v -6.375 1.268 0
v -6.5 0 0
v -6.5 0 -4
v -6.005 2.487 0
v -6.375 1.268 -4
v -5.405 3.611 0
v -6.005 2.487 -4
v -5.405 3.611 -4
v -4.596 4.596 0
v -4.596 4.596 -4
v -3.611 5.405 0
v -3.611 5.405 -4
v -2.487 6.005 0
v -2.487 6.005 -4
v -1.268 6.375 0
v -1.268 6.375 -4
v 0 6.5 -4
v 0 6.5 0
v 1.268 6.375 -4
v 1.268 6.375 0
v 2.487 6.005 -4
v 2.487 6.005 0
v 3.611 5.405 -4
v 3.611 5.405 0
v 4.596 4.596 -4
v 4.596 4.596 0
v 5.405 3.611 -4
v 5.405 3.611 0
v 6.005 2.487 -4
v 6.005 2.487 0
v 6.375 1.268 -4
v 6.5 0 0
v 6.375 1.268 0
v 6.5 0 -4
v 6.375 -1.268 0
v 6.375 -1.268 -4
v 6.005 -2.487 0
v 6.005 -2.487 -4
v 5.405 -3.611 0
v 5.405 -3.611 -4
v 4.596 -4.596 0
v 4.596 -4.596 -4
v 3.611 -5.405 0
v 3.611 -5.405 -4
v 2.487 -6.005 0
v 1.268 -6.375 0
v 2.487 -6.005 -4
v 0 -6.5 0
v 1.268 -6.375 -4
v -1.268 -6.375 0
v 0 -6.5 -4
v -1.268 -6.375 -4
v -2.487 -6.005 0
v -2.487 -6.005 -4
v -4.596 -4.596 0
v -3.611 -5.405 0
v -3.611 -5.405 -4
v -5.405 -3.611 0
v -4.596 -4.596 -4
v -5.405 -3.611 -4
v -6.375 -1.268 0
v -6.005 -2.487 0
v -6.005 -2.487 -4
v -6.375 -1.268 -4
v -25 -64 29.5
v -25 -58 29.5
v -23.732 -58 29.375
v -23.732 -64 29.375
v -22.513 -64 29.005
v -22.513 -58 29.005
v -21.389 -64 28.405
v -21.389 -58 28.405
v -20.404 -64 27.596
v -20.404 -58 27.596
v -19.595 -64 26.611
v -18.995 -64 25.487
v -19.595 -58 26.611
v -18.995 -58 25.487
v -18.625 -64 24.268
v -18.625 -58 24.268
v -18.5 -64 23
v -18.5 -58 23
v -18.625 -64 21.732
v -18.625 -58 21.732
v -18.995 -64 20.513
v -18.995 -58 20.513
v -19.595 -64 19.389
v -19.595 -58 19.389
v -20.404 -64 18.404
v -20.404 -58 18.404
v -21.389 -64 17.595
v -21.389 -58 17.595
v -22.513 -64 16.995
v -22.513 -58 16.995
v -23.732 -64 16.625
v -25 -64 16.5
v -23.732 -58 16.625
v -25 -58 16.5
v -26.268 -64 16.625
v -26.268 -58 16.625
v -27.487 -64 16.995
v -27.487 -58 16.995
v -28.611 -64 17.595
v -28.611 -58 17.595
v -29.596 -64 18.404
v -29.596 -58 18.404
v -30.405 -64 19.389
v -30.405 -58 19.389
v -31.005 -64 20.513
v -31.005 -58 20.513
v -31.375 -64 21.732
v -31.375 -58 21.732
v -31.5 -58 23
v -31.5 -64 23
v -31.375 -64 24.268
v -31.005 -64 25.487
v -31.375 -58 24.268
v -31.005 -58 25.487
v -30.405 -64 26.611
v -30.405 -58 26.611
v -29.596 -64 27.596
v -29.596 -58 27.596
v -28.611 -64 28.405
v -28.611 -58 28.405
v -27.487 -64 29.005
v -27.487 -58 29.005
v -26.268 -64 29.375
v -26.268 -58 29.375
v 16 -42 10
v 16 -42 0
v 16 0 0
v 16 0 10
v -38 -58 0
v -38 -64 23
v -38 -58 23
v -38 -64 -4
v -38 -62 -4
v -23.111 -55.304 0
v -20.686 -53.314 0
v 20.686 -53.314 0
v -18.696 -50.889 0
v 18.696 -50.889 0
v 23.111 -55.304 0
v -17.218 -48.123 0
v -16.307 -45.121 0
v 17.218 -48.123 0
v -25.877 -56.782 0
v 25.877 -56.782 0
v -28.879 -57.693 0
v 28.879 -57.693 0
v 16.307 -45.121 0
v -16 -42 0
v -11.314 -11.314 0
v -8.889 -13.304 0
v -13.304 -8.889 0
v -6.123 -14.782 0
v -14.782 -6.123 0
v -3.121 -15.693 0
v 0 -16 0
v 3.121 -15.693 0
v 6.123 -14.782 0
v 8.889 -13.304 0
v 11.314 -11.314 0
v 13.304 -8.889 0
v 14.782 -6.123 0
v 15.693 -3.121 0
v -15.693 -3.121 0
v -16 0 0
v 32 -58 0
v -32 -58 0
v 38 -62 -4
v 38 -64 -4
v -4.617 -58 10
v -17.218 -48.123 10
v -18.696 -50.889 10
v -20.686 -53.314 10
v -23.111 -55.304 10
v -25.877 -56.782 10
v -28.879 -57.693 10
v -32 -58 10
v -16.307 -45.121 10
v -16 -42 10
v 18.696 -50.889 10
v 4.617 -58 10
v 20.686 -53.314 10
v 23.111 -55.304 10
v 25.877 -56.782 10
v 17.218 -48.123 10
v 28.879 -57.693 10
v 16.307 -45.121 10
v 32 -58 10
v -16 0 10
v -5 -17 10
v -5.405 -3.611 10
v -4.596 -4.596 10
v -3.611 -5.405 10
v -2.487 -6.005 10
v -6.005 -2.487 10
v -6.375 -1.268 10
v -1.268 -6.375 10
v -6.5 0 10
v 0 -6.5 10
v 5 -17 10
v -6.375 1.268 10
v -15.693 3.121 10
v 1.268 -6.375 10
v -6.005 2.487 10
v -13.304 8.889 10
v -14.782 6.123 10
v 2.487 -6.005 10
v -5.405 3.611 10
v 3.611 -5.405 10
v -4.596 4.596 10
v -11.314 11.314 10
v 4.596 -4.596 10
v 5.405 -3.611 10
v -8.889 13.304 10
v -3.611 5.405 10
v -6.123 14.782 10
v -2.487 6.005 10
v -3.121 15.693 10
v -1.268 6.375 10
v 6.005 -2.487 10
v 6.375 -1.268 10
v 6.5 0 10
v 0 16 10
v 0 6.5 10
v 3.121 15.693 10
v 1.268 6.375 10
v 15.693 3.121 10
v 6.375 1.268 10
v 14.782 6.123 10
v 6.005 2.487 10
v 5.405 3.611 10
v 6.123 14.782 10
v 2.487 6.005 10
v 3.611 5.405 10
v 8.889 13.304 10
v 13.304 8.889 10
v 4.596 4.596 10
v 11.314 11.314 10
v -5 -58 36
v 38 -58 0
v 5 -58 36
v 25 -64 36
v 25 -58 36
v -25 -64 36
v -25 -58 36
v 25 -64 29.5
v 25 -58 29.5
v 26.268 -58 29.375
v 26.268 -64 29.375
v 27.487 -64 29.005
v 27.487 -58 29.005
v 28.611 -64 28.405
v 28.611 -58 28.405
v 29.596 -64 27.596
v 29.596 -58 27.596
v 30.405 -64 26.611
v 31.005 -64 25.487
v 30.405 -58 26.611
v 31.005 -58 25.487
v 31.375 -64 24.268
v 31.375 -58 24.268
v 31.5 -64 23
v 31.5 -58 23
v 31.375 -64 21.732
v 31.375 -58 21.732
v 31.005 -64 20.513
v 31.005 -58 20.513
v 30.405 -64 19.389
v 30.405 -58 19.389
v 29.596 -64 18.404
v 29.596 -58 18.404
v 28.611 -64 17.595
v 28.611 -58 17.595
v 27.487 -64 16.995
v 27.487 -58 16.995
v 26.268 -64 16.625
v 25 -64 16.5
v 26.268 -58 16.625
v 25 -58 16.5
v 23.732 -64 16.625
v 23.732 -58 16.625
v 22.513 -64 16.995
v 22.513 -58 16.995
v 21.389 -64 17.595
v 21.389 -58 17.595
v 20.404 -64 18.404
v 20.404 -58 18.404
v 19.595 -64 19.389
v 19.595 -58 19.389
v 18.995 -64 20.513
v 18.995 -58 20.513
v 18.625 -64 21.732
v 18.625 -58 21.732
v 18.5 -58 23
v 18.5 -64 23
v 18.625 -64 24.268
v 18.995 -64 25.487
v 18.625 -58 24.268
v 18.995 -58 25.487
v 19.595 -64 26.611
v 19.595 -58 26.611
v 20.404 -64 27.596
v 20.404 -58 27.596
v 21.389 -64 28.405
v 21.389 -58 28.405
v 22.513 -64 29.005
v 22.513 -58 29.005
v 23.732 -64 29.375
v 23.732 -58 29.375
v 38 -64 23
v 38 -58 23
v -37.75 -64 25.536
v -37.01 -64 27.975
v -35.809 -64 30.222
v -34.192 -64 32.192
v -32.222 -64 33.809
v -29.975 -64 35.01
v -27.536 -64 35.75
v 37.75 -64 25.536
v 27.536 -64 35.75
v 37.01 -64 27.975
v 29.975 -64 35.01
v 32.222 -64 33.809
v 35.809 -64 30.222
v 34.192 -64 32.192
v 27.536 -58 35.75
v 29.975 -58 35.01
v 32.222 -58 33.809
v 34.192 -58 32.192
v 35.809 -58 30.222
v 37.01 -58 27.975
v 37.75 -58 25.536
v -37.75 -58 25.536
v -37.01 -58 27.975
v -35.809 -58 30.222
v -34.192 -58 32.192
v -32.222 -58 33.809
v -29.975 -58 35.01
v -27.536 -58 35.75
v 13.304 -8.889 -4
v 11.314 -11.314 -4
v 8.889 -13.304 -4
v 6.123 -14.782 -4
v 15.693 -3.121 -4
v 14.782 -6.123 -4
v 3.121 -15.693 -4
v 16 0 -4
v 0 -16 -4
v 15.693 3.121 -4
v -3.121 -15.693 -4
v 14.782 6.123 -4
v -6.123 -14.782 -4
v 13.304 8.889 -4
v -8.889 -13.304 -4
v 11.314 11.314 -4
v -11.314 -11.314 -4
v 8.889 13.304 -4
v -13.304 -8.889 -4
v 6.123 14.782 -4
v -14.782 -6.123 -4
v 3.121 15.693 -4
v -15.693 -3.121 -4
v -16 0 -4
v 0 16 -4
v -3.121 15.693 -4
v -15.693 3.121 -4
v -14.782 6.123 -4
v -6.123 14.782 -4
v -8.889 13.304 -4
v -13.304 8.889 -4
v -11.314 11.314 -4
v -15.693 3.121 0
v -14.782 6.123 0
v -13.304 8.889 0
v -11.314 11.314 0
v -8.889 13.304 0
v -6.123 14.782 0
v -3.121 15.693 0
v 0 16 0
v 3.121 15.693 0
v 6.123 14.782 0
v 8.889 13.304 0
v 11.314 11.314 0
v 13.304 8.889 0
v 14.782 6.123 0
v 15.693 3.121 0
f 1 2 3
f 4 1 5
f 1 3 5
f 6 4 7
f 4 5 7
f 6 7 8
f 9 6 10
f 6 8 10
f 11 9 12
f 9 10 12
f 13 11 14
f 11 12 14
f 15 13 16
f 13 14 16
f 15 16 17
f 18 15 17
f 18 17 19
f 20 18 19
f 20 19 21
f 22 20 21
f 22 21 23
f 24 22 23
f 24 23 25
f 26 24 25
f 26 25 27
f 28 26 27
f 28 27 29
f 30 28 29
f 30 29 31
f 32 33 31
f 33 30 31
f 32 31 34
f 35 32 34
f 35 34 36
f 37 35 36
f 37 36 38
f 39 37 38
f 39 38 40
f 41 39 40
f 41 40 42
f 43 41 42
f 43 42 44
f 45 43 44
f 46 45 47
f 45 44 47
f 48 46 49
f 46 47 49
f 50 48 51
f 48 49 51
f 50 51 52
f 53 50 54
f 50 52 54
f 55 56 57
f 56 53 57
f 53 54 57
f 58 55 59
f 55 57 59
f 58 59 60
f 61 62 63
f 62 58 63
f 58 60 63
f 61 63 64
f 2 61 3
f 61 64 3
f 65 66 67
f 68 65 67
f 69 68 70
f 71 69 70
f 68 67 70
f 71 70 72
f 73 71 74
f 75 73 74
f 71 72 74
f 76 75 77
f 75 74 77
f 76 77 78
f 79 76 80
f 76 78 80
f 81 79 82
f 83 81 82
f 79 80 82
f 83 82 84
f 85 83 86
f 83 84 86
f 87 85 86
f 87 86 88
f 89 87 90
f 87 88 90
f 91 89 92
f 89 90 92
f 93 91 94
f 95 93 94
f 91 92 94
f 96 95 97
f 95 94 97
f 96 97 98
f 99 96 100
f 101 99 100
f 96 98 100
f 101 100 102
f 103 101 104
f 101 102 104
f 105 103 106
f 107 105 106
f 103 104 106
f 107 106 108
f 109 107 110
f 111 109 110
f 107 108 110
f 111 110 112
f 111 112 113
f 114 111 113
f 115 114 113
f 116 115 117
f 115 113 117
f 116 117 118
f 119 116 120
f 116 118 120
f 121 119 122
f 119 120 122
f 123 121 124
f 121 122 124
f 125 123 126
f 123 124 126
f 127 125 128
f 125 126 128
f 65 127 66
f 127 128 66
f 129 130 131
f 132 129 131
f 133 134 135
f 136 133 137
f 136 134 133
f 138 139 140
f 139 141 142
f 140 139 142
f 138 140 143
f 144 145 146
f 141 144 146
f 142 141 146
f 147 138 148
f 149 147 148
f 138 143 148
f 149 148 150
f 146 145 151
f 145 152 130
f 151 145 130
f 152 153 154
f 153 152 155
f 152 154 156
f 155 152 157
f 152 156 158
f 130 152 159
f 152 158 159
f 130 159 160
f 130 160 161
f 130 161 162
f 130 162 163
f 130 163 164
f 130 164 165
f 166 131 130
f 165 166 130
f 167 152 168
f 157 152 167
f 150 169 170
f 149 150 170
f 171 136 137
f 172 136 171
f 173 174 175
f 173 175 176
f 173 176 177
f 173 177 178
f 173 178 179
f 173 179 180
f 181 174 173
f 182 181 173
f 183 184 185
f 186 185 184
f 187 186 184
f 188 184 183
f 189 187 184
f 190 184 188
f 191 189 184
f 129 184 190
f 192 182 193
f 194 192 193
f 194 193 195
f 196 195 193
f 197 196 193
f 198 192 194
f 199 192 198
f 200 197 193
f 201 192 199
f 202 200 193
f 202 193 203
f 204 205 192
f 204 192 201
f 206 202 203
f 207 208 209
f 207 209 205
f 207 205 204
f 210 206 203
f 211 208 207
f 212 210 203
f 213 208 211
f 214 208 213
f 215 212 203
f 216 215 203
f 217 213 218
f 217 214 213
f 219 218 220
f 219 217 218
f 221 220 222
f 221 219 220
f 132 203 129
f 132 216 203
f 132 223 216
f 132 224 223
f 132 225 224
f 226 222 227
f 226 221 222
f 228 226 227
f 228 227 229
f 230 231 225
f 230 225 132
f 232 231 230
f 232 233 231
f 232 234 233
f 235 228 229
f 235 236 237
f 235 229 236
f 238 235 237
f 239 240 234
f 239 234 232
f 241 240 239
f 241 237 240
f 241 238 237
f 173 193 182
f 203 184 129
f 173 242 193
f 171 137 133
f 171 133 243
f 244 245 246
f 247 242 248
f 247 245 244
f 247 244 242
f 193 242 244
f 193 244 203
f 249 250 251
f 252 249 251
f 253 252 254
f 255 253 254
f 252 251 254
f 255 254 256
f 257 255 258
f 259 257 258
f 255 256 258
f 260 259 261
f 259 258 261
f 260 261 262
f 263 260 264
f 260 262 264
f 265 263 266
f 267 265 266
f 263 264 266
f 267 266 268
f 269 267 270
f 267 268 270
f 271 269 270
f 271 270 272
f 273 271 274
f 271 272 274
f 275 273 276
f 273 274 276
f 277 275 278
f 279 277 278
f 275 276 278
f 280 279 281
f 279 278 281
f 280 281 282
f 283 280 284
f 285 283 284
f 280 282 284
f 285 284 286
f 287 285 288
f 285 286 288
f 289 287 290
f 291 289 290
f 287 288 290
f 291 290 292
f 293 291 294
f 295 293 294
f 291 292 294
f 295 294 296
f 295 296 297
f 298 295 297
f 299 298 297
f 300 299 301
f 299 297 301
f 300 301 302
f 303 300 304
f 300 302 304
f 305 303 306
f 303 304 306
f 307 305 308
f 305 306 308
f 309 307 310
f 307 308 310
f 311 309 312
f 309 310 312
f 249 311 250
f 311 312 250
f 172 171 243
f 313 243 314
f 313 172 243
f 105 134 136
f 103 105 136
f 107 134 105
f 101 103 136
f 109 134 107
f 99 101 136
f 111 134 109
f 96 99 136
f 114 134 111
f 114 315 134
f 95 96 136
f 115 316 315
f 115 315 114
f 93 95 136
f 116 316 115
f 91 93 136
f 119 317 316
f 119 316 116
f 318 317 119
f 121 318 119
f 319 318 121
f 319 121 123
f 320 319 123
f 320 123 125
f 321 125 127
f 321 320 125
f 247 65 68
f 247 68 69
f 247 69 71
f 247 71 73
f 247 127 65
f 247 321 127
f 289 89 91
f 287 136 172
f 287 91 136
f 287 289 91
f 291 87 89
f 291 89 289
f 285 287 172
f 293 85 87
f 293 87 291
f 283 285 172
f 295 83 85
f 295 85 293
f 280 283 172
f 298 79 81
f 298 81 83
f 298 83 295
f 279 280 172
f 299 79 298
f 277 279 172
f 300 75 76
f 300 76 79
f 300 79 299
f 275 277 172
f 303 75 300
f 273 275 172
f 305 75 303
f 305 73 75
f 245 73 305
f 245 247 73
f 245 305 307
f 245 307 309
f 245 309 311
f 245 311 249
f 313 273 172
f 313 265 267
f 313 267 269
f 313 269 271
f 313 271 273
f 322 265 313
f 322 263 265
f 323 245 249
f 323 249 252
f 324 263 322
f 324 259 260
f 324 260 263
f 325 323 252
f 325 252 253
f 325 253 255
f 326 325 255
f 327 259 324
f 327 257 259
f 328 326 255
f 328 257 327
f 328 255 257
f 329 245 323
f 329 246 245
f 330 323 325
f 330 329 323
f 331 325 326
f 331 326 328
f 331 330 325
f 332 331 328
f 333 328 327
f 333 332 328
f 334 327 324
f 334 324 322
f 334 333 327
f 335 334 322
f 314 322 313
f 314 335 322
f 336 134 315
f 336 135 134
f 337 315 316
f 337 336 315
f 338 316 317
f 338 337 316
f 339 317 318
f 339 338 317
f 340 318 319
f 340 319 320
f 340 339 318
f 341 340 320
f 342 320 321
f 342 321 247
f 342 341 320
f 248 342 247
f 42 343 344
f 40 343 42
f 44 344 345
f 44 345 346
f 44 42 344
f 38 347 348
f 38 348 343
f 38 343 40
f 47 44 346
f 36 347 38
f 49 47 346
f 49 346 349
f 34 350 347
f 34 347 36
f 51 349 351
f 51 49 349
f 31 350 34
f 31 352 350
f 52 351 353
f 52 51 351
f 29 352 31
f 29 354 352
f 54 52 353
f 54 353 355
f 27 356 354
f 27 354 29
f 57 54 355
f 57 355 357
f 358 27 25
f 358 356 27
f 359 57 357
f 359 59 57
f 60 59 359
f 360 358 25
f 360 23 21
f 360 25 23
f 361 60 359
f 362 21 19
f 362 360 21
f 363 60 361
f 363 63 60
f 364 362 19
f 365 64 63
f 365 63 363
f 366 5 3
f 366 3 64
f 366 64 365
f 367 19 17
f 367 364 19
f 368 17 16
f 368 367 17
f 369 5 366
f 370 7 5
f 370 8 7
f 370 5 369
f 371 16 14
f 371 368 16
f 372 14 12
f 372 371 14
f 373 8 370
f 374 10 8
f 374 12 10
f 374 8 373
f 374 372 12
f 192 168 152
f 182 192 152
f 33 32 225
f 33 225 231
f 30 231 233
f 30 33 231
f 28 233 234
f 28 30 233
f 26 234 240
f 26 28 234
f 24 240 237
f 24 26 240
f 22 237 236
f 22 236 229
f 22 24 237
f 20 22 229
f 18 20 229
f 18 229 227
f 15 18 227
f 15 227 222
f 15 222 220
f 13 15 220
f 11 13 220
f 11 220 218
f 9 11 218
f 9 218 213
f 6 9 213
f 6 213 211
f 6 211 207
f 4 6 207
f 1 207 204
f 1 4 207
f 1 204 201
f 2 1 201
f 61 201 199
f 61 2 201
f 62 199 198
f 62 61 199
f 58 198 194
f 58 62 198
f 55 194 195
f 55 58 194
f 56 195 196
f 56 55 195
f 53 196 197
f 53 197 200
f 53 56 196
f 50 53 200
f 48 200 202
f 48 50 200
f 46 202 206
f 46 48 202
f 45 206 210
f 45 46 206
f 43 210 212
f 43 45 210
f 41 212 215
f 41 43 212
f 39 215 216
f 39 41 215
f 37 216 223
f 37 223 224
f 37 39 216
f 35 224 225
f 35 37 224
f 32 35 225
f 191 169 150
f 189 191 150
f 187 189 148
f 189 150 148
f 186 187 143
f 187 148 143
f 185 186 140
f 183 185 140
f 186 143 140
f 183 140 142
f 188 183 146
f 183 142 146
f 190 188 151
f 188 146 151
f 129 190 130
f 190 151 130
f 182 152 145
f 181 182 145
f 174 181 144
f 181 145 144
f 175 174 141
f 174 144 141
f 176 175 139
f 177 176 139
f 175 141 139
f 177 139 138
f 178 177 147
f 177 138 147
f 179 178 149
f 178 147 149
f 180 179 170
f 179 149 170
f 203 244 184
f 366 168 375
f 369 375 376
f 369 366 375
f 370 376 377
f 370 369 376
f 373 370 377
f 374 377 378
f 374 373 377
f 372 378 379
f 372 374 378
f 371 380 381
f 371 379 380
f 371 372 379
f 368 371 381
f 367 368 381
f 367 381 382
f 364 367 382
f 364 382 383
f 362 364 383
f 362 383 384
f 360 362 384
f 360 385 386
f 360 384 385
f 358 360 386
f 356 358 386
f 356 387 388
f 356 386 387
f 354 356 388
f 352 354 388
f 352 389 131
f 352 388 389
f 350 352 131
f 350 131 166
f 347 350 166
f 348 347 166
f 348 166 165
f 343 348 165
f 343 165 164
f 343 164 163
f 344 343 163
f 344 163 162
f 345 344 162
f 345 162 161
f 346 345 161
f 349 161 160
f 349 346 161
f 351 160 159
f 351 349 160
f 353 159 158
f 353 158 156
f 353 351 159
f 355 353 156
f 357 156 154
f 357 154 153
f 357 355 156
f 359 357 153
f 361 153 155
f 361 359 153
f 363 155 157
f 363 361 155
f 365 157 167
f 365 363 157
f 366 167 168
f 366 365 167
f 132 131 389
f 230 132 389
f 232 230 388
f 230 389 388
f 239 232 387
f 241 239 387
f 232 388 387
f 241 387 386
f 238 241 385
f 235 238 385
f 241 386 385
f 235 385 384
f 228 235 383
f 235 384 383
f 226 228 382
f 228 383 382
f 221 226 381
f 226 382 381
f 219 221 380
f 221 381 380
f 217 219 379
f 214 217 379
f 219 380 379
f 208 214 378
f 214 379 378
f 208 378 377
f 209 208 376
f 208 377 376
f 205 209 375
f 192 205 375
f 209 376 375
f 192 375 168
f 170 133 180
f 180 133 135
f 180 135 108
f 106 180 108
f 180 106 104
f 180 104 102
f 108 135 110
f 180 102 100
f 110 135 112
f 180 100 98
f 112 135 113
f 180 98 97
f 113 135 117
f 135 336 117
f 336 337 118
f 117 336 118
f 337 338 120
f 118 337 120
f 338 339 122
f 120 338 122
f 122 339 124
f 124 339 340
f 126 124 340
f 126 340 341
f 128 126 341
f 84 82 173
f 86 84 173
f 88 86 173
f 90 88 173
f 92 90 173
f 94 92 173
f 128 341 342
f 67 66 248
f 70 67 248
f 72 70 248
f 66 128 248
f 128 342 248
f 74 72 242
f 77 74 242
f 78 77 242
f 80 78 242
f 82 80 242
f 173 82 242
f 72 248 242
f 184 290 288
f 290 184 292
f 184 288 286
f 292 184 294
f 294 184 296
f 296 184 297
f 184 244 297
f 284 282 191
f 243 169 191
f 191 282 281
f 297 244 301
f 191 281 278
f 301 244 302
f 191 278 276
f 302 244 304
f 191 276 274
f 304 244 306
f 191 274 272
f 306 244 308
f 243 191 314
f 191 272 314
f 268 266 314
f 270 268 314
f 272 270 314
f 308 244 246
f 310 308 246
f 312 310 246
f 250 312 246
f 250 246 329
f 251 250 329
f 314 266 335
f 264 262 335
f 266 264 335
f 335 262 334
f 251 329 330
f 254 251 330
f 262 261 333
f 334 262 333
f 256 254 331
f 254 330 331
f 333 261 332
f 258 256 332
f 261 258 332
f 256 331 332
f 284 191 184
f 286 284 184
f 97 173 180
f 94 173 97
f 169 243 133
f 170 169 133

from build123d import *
from build123d.topology import SkipClean

# Parameters (mm, degrees)
CROQUIS1_R              = 6.5
SALIENTE_EXTRUIR1_DEPTH = 10
SALIENTE_EXTRUIR2_START = 4
CROQUIS2_R              = 16
SALIENTE_EXTRUIR2_DEPTH = 4
CROQUIS3_R              = 6.5
CORTAR_EXTRUIR1_DEPTH   = 4
SALIENTE_EXTRUIR3_DEPTH = 6
NERVIO1_REACH           = 84.68
CROQUIS5_WALL_W         = 215.909157244
CROQUIS5_WALL_H         = 10
NERVIO1_DRAFT_ANGLE     = -1
CHAFL_N3_SIZE           = 4
REDONDEO1_R             = 13
REDONDEO2_R             = 13
CROQUIS6_R              = 6.5
CORTAR_EXTRUIR2_DEPTH   = 6


with BuildPart() as part:
    # Croquis1 → Saliente-Extruir1 (new body)
    with BuildSketch(Plane.XY):
        with BuildLine():
            Line((-16, 0), (-16, -42))
            ThreePointArc((-16, -42), (-20.686291501, -53.313708499), (-32, -58))
            Line((-32, -58), (-38, -58))
            Line((-38, -58), (-38, -64))
            Line((-38, -64), (38, -64))
            Line((38, -64), (38, -58))
            Line((38, -58), (32, -58))
            ThreePointArc((32, -58), (20.686291501, -53.313708499), (16, -42))
            Line((16, -42), (16, 0))
            ThreePointArc((16, 0), (0, 16), (-16, 0))
        make_face()
        Circle(CROQUIS1_R, mode=Mode.SUBTRACT)
    extrude(amount=SALIENTE_EXTRUIR1_DEPTH)

    # Croquis2 → Saliente-Extruir2 (add)
    with SkipClean():  # the faces are left unmerged after this step: merging them gives an invalid solid
        with BuildSketch(Plane(origin=(0, 0, 0), x_dir=(-1, 0, 0), z_dir=(0, 0, -1)).offset(SALIENTE_EXTRUIR2_START)):
            Circle(CROQUIS2_R)
        extrude(amount=-SALIENTE_EXTRUIR2_DEPTH)

    # Croquis3 → Cortar-Extruir1 (cut)
    with SkipClean():  # the faces are left unmerged after this step: merging them gives an invalid solid
        with BuildSketch(Plane(origin=(0, 0, -4), x_dir=(-1, 0, 0), z_dir=(0, 0, -1))):
            Circle(CROQUIS3_R)
        extrude(amount=-CORTAR_EXTRUIR1_DEPTH, mode=Mode.SUBTRACT)

    # Croquis4 → Saliente-Extruir3 (add)
    with SkipClean():  # the faces are left unmerged after this step: merging them gives an invalid solid
        with BuildSketch(Plane.XZ.offset(64)):
            Polygon((38, 0), (38, 36), (-38, 36), (-38, -4), (38, -4), align=None)
        extrude(amount=-SALIENTE_EXTRUIR3_DEPTH)

    # Croquis5 wall → Nervio1 (add, up to next)
    with BuildSketch(Plane(origin=(0, -37.5, 23), x_dir=(0, 0.84450857845, -0.535542025358), z_dir=(0, 0.535542025358, 0.84450857845)), mode=Mode.PRIVATE) as nervio1_sk1:
        Rectangle(CROQUIS5_WALL_W, CROQUIS5_WALL_H)
    nervio1_tool1 = extrude(nervio1_sk1.sketch, amount=-NERVIO1_REACH, mode=Mode.PRIVATE) - part.part
    add(nervio1_tool1.solids().sort_by_distance((0, -37.5, 23))[0])

    # Nervio1 draft
    nervio1_draft_faces = [part.faces().sort_by_distance(p)[0] for p in [
        (-5, -37.767771013, 22.577745711),
        (5, -37.767771013, 22.577745711),
    ]]
    draft(nervio1_draft_faces, Plane(origin=(0, -37.5, 23), x_dir=(0, 0.84450857845, -0.535542025358), z_dir=(0, 0.535542025358, 0.84450857845)), NERVIO1_DRAFT_ANGLE)

    # Chaflán3
    chafl_n3_edges = [part.edges().sort_by_distance(p)[0] for p in [
        (0, -58, -4),
    ]]
    chamfer(chafl_n3_edges, length=CHAFL_N3_SIZE - 0.0001)  # a hair under: the kernel refuses the full size

    # Redondeo1
    redondeo1_edges = [part.edges().sort_by_distance(p)[0] for p in [
        (-38, -61, 36),
    ]]
    fillet(redondeo1_edges, radius=REDONDEO1_R)

    # Redondeo2
    redondeo2_edges = [part.edges().sort_by_distance(p)[0] for p in [
        (38, -61, 36),
    ]]
    fillet(redondeo2_edges, radius=REDONDEO2_R)

    # Croquis6 → Cortar-Extruir2 (cut)
    with BuildSketch(Plane(origin=(0, -58, 0), x_dir=(1, 0, 0), z_dir=(0, 1, 0))):
        with Locations(Location((-25, -23, 0), (0, 0, 270))):
            Circle(CROQUIS6_R)
        with Locations(Location((25, -23, 0), (0, 0, 270))):
            Circle(CROQUIS6_R)
    extrude(amount=-CORTAR_EXTRUIR2_DEPTH, mode=Mode.SUBTRACT)


solid = part.part
